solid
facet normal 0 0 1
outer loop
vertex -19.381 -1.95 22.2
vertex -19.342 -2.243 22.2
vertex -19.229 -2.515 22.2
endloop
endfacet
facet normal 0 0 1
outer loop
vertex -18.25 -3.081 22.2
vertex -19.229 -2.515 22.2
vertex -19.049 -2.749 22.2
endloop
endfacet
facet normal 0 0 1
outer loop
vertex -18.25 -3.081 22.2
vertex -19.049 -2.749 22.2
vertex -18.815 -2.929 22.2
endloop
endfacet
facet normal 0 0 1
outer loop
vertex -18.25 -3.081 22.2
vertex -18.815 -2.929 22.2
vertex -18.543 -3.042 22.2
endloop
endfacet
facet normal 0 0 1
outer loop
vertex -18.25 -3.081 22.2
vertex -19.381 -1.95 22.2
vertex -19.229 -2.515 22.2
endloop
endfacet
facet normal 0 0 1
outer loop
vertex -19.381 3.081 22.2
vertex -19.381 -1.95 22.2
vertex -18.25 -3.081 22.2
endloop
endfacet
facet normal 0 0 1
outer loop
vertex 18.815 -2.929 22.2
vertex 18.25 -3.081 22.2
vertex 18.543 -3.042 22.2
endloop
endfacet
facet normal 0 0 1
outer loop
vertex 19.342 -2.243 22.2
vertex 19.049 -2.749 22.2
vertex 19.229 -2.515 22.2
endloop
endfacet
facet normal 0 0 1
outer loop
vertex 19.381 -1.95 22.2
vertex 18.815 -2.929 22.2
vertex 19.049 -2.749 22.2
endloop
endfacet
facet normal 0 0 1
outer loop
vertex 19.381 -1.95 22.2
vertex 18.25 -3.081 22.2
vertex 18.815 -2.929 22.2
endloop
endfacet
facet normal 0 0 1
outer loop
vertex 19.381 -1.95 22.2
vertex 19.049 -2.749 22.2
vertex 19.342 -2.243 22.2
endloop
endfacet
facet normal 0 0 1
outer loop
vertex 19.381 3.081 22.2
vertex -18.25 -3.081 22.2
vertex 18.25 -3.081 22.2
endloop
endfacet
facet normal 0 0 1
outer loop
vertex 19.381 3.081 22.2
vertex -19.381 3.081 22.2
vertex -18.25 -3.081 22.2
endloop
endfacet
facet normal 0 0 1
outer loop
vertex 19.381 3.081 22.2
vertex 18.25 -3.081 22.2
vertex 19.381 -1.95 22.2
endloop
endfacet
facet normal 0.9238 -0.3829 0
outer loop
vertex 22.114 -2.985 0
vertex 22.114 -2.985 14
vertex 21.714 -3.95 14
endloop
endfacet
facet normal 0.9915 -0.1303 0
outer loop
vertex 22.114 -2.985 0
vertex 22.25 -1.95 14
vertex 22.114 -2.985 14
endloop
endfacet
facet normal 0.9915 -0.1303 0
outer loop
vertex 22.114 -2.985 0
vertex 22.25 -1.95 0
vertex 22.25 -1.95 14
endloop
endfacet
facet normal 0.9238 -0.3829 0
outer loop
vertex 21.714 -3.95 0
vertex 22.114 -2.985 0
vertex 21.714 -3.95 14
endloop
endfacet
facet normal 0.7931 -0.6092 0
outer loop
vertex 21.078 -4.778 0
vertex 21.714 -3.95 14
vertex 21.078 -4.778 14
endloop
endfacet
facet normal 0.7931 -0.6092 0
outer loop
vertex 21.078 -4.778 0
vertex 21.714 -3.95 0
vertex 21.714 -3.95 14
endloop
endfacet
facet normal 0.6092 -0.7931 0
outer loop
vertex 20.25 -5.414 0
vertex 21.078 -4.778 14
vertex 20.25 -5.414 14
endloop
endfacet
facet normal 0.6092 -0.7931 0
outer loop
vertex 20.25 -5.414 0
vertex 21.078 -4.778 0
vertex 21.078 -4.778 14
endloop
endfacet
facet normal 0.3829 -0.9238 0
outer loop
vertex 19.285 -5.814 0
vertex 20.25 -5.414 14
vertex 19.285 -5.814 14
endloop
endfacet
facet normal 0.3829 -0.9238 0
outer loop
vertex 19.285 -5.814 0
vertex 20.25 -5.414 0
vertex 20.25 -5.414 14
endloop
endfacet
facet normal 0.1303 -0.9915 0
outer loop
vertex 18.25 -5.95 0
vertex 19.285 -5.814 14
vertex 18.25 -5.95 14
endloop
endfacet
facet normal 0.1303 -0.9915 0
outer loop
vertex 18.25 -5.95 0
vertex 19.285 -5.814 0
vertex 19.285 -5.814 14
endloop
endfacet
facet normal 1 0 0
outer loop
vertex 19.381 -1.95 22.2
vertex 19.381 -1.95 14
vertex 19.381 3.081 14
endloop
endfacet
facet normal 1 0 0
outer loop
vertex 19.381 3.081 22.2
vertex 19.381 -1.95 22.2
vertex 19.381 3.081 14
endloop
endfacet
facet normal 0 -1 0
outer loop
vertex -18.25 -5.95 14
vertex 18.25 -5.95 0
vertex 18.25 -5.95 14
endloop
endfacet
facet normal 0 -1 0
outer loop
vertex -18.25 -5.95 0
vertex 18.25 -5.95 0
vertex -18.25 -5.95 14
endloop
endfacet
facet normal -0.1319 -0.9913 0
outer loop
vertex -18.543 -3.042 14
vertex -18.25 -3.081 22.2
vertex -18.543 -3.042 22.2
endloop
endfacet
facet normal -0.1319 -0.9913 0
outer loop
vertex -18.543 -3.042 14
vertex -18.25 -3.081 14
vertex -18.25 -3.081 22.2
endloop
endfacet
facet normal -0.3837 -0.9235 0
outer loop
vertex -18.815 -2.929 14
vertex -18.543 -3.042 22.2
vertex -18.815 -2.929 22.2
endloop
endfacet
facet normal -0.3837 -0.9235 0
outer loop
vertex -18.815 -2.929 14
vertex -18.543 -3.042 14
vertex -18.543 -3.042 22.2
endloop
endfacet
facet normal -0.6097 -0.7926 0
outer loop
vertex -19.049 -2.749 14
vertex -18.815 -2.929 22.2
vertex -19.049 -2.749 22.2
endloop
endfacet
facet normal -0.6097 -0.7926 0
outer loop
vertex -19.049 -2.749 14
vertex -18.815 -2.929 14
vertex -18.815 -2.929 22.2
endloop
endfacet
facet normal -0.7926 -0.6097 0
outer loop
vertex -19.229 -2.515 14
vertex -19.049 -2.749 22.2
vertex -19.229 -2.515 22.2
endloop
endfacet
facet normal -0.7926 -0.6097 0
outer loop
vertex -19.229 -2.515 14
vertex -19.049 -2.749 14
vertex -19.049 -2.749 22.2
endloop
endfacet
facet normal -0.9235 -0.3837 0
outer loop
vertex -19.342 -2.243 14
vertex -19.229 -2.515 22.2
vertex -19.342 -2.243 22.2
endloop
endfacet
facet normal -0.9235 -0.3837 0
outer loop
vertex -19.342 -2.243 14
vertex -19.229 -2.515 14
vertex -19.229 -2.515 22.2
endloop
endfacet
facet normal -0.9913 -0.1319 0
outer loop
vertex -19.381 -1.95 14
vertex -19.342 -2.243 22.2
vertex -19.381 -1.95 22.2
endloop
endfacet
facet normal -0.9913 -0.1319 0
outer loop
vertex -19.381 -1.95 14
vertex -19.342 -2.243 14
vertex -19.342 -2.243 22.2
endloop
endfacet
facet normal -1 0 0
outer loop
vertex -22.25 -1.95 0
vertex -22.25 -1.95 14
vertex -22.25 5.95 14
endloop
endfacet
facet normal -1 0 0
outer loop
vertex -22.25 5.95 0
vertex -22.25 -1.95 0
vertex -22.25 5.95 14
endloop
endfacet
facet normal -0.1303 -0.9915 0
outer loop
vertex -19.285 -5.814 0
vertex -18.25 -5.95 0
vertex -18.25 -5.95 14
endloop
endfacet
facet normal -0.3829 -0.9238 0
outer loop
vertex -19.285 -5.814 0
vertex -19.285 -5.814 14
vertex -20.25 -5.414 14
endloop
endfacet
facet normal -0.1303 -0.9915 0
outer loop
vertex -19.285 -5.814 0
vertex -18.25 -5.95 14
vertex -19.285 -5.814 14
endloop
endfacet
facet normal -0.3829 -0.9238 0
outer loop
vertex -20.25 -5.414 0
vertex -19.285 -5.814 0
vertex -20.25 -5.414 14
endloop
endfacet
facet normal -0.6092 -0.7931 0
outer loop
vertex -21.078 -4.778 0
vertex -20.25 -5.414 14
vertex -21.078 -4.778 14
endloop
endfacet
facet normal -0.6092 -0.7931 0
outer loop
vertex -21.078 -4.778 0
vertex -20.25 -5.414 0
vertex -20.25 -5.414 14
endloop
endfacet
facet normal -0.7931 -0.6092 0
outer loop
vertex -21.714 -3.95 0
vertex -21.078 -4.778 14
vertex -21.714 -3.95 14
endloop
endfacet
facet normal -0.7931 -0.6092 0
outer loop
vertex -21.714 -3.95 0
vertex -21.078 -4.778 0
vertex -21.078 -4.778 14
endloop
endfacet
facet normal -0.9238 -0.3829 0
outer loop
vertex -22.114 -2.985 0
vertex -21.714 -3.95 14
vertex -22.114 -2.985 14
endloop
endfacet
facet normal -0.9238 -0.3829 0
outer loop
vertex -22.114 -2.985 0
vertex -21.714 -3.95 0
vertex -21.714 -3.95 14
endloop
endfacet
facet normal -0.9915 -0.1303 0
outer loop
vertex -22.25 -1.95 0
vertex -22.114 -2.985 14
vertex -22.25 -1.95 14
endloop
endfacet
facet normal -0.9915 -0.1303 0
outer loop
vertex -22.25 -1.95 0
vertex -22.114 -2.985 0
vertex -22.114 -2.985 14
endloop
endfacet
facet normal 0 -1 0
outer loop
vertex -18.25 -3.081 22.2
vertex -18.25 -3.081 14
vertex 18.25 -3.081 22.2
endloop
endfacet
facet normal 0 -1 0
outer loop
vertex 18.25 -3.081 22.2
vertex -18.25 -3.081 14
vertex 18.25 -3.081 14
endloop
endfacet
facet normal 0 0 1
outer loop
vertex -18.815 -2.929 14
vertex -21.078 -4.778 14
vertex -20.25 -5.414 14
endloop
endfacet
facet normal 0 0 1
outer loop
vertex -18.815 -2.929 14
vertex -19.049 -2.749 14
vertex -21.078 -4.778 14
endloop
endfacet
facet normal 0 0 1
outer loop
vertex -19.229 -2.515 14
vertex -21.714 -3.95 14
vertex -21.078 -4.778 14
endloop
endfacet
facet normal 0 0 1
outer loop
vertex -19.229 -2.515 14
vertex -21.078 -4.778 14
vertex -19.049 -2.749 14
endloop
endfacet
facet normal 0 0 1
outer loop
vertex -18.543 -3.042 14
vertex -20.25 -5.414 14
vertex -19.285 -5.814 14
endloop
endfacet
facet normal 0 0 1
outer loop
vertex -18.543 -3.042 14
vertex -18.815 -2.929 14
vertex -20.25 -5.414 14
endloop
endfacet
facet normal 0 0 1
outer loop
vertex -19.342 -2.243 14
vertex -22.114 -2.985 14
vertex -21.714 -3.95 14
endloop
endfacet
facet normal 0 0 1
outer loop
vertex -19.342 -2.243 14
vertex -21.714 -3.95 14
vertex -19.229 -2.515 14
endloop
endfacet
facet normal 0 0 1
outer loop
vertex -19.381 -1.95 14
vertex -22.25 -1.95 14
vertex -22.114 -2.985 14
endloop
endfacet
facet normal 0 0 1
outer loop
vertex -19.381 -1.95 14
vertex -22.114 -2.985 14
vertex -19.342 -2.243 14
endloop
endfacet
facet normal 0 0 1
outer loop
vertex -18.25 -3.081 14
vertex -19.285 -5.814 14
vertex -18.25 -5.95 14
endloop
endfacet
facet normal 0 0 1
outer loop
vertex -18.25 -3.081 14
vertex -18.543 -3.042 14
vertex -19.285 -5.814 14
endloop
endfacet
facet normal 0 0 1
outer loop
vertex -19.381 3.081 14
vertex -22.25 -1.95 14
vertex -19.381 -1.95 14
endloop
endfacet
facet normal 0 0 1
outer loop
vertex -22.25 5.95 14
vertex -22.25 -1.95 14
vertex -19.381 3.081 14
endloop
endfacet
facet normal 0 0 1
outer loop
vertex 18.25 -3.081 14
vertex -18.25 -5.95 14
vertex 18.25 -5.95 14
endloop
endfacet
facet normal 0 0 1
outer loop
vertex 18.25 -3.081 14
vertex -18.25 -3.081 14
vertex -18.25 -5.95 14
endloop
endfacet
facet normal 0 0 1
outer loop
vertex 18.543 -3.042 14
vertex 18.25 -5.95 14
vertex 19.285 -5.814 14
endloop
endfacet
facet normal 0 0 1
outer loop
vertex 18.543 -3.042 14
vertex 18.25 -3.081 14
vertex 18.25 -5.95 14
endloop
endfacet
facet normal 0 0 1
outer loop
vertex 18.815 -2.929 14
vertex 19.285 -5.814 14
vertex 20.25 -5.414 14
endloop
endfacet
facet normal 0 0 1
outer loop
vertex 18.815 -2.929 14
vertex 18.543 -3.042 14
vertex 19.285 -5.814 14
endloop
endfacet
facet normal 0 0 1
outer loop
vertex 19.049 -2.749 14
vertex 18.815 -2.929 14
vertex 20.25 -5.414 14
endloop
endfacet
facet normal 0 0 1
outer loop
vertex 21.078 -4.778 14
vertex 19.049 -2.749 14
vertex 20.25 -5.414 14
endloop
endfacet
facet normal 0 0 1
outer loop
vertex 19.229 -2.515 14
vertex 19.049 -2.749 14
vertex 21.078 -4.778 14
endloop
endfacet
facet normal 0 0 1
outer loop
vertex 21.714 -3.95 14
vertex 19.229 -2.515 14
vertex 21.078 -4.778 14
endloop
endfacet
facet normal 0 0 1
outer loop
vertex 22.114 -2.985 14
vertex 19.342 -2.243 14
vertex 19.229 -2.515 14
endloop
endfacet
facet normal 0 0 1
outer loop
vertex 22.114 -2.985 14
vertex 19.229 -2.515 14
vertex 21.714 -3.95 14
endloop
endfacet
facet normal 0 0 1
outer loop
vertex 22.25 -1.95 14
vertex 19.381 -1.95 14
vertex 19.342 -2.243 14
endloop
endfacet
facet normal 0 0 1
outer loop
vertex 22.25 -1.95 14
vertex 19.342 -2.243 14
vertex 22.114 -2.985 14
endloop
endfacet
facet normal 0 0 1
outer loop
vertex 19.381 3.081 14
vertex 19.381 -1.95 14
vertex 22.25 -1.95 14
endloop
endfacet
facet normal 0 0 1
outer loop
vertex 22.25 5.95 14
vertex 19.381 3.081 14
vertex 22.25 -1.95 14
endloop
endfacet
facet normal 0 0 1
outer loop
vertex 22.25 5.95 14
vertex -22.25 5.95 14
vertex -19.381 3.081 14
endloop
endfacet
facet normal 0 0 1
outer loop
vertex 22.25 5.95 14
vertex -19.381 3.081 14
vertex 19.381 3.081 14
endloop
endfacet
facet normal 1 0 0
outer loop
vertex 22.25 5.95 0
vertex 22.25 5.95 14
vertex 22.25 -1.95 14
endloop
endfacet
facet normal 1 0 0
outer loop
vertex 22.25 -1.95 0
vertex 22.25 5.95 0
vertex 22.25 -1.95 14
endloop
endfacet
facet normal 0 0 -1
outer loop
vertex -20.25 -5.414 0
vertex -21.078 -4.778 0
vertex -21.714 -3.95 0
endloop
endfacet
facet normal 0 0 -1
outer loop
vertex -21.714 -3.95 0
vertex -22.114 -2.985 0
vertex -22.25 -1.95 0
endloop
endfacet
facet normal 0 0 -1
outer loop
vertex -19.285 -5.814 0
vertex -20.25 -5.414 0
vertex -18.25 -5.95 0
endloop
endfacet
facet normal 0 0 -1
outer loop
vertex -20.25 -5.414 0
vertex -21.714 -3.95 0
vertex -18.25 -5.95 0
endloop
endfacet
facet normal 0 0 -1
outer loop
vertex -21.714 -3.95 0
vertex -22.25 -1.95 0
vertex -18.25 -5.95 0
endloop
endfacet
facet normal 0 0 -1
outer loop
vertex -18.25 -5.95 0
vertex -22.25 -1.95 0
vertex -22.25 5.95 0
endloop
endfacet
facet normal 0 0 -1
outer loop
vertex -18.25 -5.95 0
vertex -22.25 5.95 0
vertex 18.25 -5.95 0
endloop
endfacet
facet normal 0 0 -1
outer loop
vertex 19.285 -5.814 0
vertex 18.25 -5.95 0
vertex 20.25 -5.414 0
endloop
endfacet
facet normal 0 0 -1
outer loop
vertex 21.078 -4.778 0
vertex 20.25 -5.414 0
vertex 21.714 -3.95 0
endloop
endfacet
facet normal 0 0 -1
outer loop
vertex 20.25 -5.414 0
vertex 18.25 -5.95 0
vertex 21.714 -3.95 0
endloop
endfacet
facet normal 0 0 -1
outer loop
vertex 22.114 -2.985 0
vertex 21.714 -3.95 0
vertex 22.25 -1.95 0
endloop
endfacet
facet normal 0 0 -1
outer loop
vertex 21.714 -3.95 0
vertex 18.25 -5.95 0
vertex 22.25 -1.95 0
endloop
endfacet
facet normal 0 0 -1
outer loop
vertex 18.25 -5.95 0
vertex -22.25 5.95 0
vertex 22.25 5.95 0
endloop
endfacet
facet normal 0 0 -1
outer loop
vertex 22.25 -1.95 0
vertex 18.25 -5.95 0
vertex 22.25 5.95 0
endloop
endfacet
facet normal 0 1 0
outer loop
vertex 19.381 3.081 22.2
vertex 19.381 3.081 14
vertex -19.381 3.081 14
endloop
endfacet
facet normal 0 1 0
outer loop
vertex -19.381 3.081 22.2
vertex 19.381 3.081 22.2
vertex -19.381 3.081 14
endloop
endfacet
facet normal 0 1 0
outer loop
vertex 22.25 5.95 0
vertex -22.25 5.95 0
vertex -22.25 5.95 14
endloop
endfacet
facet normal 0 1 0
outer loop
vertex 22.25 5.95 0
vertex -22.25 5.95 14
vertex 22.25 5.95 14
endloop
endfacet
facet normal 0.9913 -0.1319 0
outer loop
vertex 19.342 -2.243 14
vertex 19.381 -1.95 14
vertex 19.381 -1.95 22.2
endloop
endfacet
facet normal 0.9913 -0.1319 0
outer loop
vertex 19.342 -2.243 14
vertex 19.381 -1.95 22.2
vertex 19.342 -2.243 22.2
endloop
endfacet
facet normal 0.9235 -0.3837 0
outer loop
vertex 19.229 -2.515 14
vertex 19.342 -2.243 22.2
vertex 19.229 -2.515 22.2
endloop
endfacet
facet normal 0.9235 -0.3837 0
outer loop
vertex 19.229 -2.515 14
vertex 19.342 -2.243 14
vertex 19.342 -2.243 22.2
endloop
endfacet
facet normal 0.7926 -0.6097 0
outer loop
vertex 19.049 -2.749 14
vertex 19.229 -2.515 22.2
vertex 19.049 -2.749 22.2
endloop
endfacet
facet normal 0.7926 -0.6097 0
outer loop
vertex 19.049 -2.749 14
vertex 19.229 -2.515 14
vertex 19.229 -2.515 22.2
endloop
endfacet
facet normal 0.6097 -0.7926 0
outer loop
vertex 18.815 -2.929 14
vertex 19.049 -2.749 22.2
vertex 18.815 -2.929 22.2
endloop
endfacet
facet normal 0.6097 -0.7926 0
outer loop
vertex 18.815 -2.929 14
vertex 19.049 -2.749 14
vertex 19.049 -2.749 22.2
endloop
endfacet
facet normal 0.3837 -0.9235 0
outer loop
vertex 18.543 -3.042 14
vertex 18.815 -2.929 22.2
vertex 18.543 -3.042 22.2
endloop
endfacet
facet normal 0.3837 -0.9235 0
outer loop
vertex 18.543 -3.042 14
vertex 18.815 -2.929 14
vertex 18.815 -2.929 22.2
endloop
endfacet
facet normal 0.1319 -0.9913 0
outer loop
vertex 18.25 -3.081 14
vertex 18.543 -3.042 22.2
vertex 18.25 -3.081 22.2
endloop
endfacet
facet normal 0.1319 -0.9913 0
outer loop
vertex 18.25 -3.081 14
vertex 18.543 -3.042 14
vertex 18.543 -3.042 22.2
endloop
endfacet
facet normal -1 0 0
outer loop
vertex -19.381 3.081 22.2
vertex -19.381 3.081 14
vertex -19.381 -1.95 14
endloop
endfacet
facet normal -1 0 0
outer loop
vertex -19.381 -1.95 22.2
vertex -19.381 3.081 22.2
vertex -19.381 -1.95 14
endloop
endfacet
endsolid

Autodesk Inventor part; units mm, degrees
ref_plane "YZ Plane" through (0, 0, 0) normal (1, 0, 0) x (0, 1, 0)
ref_plane "XZ Plane" through (0, 0, 0) normal (0, 1, 0) x (-1, 0, 0)
ref_plane "XY Plane" through (0, 0, 0) normal (0, 0, 1) x (1, 0, 0)
sketch "Sketch1" plane through (0, 0, 0) normal (0, 0, 1) x (1, 0, 0)
  line L0 (-22.25, 5.95) -> (22.25, 5.95) construction
  line L1 (22.25, 5.95) -> (22.25, -1.95)
  line L2 (18.25, -5.95) -> (-18.25, -5.95)
  line L3 (-22.25, -1.95) -> (-22.25, 5.95)
  line L4 (-22.25, 5.95) -> (22.25, -5.95) construction
  line L5 (22.25, 5.95) -> (-22.25, -5.95) construction
  arc A0 (-22.25, -1.95) -> (-18.25, -5.95) centre (-18.25, -1.95) ccw
  arc A1 (18.25, -5.95) -> (22.25, -1.95) centre (18.25, -1.95) ccw
  line L6 (-18.25, -5.95) -> (18.25, -5.95)
  line L7 (-22.25, -1.95) -> (-22.25, 5.95)
  line L8 (-22.25, 5.95) -> (22.25, 5.95)
  line L9 (22.25, 5.95) -> (22.25, -1.95)
  point P0 (0, 0)
  dimension "d0" = 44.5
  dimension "d1" = 11.9
  dimension "d2" = 4
extrude "Extrusion1" add sketch "Sketch1" along normal blind 14
sketch "Sketch2" plane through (0, 0, 14) normal (0, 0, 1) x (1, 0, 0)
  line L0 (-22.25, 5.95) -> (-22.25, -1.95) projected
  arc A0 (-22.25, -1.95) -> (-18.25, -5.95) centre (-18.25, -1.95) ccw projected
  line L1 (-18.25, -5.95) -> (18.25, -5.95) projected
  arc A1 (18.25, -5.95) -> (22.25, -1.95) centre (18.25, -1.95) ccw projected
  line L2 (22.25, -1.95) -> (22.25, 5.95) projected
  line L3 (22.25, 5.95) -> (-22.25, 5.95) projected
  line L4 (-19.3806, 3.0806) -> (-19.3806, -1.95)
  arc A2 (-19.3806, -1.95) -> (-18.25, -3.0806) centre (-18.25, -1.95) ccw
  line L5 (-18.25, -3.0806) -> (18.25, -3.0806)
  arc A3 (18.25, -3.0806) -> (19.3806, -1.95) centre (18.25, -1.95) ccw
  line L6 (19.3806, -1.95) -> (19.3806, 3.0806)
  line L7 (19.3806, 3.0806) -> (-19.3806, 3.0806)
  point P0 (0, 0)
extrude "Extrusion2" add sketch "Sketch2" along normal blind 8.2 contours L7 L6 A3 L5 A2 L4
sketch "Sketch3" plane through (0, 0, 0) normal (0, 0, -1) x (-1, 0, 0)
  point P0 (0, 0)
  point P1 (0, 0)
sketch "Sketch4" plane through (-22.25, 5.95, 0) normal (0, 1, 0) x (1, 0, 0)
  line L0 (44.5, 0) -> (0, 0) construction
  line L1 (0, 0) -> (0, -14) construction
  line L2 (44.5, -14) -> (0, -14) construction
  line L3 (44.5, 0) -> (44.5, -14) construction
  point P0 (22.25, 0)
  point P1 (22.25, -7)
properties part number "ps2conn" material "PET Plastic"
